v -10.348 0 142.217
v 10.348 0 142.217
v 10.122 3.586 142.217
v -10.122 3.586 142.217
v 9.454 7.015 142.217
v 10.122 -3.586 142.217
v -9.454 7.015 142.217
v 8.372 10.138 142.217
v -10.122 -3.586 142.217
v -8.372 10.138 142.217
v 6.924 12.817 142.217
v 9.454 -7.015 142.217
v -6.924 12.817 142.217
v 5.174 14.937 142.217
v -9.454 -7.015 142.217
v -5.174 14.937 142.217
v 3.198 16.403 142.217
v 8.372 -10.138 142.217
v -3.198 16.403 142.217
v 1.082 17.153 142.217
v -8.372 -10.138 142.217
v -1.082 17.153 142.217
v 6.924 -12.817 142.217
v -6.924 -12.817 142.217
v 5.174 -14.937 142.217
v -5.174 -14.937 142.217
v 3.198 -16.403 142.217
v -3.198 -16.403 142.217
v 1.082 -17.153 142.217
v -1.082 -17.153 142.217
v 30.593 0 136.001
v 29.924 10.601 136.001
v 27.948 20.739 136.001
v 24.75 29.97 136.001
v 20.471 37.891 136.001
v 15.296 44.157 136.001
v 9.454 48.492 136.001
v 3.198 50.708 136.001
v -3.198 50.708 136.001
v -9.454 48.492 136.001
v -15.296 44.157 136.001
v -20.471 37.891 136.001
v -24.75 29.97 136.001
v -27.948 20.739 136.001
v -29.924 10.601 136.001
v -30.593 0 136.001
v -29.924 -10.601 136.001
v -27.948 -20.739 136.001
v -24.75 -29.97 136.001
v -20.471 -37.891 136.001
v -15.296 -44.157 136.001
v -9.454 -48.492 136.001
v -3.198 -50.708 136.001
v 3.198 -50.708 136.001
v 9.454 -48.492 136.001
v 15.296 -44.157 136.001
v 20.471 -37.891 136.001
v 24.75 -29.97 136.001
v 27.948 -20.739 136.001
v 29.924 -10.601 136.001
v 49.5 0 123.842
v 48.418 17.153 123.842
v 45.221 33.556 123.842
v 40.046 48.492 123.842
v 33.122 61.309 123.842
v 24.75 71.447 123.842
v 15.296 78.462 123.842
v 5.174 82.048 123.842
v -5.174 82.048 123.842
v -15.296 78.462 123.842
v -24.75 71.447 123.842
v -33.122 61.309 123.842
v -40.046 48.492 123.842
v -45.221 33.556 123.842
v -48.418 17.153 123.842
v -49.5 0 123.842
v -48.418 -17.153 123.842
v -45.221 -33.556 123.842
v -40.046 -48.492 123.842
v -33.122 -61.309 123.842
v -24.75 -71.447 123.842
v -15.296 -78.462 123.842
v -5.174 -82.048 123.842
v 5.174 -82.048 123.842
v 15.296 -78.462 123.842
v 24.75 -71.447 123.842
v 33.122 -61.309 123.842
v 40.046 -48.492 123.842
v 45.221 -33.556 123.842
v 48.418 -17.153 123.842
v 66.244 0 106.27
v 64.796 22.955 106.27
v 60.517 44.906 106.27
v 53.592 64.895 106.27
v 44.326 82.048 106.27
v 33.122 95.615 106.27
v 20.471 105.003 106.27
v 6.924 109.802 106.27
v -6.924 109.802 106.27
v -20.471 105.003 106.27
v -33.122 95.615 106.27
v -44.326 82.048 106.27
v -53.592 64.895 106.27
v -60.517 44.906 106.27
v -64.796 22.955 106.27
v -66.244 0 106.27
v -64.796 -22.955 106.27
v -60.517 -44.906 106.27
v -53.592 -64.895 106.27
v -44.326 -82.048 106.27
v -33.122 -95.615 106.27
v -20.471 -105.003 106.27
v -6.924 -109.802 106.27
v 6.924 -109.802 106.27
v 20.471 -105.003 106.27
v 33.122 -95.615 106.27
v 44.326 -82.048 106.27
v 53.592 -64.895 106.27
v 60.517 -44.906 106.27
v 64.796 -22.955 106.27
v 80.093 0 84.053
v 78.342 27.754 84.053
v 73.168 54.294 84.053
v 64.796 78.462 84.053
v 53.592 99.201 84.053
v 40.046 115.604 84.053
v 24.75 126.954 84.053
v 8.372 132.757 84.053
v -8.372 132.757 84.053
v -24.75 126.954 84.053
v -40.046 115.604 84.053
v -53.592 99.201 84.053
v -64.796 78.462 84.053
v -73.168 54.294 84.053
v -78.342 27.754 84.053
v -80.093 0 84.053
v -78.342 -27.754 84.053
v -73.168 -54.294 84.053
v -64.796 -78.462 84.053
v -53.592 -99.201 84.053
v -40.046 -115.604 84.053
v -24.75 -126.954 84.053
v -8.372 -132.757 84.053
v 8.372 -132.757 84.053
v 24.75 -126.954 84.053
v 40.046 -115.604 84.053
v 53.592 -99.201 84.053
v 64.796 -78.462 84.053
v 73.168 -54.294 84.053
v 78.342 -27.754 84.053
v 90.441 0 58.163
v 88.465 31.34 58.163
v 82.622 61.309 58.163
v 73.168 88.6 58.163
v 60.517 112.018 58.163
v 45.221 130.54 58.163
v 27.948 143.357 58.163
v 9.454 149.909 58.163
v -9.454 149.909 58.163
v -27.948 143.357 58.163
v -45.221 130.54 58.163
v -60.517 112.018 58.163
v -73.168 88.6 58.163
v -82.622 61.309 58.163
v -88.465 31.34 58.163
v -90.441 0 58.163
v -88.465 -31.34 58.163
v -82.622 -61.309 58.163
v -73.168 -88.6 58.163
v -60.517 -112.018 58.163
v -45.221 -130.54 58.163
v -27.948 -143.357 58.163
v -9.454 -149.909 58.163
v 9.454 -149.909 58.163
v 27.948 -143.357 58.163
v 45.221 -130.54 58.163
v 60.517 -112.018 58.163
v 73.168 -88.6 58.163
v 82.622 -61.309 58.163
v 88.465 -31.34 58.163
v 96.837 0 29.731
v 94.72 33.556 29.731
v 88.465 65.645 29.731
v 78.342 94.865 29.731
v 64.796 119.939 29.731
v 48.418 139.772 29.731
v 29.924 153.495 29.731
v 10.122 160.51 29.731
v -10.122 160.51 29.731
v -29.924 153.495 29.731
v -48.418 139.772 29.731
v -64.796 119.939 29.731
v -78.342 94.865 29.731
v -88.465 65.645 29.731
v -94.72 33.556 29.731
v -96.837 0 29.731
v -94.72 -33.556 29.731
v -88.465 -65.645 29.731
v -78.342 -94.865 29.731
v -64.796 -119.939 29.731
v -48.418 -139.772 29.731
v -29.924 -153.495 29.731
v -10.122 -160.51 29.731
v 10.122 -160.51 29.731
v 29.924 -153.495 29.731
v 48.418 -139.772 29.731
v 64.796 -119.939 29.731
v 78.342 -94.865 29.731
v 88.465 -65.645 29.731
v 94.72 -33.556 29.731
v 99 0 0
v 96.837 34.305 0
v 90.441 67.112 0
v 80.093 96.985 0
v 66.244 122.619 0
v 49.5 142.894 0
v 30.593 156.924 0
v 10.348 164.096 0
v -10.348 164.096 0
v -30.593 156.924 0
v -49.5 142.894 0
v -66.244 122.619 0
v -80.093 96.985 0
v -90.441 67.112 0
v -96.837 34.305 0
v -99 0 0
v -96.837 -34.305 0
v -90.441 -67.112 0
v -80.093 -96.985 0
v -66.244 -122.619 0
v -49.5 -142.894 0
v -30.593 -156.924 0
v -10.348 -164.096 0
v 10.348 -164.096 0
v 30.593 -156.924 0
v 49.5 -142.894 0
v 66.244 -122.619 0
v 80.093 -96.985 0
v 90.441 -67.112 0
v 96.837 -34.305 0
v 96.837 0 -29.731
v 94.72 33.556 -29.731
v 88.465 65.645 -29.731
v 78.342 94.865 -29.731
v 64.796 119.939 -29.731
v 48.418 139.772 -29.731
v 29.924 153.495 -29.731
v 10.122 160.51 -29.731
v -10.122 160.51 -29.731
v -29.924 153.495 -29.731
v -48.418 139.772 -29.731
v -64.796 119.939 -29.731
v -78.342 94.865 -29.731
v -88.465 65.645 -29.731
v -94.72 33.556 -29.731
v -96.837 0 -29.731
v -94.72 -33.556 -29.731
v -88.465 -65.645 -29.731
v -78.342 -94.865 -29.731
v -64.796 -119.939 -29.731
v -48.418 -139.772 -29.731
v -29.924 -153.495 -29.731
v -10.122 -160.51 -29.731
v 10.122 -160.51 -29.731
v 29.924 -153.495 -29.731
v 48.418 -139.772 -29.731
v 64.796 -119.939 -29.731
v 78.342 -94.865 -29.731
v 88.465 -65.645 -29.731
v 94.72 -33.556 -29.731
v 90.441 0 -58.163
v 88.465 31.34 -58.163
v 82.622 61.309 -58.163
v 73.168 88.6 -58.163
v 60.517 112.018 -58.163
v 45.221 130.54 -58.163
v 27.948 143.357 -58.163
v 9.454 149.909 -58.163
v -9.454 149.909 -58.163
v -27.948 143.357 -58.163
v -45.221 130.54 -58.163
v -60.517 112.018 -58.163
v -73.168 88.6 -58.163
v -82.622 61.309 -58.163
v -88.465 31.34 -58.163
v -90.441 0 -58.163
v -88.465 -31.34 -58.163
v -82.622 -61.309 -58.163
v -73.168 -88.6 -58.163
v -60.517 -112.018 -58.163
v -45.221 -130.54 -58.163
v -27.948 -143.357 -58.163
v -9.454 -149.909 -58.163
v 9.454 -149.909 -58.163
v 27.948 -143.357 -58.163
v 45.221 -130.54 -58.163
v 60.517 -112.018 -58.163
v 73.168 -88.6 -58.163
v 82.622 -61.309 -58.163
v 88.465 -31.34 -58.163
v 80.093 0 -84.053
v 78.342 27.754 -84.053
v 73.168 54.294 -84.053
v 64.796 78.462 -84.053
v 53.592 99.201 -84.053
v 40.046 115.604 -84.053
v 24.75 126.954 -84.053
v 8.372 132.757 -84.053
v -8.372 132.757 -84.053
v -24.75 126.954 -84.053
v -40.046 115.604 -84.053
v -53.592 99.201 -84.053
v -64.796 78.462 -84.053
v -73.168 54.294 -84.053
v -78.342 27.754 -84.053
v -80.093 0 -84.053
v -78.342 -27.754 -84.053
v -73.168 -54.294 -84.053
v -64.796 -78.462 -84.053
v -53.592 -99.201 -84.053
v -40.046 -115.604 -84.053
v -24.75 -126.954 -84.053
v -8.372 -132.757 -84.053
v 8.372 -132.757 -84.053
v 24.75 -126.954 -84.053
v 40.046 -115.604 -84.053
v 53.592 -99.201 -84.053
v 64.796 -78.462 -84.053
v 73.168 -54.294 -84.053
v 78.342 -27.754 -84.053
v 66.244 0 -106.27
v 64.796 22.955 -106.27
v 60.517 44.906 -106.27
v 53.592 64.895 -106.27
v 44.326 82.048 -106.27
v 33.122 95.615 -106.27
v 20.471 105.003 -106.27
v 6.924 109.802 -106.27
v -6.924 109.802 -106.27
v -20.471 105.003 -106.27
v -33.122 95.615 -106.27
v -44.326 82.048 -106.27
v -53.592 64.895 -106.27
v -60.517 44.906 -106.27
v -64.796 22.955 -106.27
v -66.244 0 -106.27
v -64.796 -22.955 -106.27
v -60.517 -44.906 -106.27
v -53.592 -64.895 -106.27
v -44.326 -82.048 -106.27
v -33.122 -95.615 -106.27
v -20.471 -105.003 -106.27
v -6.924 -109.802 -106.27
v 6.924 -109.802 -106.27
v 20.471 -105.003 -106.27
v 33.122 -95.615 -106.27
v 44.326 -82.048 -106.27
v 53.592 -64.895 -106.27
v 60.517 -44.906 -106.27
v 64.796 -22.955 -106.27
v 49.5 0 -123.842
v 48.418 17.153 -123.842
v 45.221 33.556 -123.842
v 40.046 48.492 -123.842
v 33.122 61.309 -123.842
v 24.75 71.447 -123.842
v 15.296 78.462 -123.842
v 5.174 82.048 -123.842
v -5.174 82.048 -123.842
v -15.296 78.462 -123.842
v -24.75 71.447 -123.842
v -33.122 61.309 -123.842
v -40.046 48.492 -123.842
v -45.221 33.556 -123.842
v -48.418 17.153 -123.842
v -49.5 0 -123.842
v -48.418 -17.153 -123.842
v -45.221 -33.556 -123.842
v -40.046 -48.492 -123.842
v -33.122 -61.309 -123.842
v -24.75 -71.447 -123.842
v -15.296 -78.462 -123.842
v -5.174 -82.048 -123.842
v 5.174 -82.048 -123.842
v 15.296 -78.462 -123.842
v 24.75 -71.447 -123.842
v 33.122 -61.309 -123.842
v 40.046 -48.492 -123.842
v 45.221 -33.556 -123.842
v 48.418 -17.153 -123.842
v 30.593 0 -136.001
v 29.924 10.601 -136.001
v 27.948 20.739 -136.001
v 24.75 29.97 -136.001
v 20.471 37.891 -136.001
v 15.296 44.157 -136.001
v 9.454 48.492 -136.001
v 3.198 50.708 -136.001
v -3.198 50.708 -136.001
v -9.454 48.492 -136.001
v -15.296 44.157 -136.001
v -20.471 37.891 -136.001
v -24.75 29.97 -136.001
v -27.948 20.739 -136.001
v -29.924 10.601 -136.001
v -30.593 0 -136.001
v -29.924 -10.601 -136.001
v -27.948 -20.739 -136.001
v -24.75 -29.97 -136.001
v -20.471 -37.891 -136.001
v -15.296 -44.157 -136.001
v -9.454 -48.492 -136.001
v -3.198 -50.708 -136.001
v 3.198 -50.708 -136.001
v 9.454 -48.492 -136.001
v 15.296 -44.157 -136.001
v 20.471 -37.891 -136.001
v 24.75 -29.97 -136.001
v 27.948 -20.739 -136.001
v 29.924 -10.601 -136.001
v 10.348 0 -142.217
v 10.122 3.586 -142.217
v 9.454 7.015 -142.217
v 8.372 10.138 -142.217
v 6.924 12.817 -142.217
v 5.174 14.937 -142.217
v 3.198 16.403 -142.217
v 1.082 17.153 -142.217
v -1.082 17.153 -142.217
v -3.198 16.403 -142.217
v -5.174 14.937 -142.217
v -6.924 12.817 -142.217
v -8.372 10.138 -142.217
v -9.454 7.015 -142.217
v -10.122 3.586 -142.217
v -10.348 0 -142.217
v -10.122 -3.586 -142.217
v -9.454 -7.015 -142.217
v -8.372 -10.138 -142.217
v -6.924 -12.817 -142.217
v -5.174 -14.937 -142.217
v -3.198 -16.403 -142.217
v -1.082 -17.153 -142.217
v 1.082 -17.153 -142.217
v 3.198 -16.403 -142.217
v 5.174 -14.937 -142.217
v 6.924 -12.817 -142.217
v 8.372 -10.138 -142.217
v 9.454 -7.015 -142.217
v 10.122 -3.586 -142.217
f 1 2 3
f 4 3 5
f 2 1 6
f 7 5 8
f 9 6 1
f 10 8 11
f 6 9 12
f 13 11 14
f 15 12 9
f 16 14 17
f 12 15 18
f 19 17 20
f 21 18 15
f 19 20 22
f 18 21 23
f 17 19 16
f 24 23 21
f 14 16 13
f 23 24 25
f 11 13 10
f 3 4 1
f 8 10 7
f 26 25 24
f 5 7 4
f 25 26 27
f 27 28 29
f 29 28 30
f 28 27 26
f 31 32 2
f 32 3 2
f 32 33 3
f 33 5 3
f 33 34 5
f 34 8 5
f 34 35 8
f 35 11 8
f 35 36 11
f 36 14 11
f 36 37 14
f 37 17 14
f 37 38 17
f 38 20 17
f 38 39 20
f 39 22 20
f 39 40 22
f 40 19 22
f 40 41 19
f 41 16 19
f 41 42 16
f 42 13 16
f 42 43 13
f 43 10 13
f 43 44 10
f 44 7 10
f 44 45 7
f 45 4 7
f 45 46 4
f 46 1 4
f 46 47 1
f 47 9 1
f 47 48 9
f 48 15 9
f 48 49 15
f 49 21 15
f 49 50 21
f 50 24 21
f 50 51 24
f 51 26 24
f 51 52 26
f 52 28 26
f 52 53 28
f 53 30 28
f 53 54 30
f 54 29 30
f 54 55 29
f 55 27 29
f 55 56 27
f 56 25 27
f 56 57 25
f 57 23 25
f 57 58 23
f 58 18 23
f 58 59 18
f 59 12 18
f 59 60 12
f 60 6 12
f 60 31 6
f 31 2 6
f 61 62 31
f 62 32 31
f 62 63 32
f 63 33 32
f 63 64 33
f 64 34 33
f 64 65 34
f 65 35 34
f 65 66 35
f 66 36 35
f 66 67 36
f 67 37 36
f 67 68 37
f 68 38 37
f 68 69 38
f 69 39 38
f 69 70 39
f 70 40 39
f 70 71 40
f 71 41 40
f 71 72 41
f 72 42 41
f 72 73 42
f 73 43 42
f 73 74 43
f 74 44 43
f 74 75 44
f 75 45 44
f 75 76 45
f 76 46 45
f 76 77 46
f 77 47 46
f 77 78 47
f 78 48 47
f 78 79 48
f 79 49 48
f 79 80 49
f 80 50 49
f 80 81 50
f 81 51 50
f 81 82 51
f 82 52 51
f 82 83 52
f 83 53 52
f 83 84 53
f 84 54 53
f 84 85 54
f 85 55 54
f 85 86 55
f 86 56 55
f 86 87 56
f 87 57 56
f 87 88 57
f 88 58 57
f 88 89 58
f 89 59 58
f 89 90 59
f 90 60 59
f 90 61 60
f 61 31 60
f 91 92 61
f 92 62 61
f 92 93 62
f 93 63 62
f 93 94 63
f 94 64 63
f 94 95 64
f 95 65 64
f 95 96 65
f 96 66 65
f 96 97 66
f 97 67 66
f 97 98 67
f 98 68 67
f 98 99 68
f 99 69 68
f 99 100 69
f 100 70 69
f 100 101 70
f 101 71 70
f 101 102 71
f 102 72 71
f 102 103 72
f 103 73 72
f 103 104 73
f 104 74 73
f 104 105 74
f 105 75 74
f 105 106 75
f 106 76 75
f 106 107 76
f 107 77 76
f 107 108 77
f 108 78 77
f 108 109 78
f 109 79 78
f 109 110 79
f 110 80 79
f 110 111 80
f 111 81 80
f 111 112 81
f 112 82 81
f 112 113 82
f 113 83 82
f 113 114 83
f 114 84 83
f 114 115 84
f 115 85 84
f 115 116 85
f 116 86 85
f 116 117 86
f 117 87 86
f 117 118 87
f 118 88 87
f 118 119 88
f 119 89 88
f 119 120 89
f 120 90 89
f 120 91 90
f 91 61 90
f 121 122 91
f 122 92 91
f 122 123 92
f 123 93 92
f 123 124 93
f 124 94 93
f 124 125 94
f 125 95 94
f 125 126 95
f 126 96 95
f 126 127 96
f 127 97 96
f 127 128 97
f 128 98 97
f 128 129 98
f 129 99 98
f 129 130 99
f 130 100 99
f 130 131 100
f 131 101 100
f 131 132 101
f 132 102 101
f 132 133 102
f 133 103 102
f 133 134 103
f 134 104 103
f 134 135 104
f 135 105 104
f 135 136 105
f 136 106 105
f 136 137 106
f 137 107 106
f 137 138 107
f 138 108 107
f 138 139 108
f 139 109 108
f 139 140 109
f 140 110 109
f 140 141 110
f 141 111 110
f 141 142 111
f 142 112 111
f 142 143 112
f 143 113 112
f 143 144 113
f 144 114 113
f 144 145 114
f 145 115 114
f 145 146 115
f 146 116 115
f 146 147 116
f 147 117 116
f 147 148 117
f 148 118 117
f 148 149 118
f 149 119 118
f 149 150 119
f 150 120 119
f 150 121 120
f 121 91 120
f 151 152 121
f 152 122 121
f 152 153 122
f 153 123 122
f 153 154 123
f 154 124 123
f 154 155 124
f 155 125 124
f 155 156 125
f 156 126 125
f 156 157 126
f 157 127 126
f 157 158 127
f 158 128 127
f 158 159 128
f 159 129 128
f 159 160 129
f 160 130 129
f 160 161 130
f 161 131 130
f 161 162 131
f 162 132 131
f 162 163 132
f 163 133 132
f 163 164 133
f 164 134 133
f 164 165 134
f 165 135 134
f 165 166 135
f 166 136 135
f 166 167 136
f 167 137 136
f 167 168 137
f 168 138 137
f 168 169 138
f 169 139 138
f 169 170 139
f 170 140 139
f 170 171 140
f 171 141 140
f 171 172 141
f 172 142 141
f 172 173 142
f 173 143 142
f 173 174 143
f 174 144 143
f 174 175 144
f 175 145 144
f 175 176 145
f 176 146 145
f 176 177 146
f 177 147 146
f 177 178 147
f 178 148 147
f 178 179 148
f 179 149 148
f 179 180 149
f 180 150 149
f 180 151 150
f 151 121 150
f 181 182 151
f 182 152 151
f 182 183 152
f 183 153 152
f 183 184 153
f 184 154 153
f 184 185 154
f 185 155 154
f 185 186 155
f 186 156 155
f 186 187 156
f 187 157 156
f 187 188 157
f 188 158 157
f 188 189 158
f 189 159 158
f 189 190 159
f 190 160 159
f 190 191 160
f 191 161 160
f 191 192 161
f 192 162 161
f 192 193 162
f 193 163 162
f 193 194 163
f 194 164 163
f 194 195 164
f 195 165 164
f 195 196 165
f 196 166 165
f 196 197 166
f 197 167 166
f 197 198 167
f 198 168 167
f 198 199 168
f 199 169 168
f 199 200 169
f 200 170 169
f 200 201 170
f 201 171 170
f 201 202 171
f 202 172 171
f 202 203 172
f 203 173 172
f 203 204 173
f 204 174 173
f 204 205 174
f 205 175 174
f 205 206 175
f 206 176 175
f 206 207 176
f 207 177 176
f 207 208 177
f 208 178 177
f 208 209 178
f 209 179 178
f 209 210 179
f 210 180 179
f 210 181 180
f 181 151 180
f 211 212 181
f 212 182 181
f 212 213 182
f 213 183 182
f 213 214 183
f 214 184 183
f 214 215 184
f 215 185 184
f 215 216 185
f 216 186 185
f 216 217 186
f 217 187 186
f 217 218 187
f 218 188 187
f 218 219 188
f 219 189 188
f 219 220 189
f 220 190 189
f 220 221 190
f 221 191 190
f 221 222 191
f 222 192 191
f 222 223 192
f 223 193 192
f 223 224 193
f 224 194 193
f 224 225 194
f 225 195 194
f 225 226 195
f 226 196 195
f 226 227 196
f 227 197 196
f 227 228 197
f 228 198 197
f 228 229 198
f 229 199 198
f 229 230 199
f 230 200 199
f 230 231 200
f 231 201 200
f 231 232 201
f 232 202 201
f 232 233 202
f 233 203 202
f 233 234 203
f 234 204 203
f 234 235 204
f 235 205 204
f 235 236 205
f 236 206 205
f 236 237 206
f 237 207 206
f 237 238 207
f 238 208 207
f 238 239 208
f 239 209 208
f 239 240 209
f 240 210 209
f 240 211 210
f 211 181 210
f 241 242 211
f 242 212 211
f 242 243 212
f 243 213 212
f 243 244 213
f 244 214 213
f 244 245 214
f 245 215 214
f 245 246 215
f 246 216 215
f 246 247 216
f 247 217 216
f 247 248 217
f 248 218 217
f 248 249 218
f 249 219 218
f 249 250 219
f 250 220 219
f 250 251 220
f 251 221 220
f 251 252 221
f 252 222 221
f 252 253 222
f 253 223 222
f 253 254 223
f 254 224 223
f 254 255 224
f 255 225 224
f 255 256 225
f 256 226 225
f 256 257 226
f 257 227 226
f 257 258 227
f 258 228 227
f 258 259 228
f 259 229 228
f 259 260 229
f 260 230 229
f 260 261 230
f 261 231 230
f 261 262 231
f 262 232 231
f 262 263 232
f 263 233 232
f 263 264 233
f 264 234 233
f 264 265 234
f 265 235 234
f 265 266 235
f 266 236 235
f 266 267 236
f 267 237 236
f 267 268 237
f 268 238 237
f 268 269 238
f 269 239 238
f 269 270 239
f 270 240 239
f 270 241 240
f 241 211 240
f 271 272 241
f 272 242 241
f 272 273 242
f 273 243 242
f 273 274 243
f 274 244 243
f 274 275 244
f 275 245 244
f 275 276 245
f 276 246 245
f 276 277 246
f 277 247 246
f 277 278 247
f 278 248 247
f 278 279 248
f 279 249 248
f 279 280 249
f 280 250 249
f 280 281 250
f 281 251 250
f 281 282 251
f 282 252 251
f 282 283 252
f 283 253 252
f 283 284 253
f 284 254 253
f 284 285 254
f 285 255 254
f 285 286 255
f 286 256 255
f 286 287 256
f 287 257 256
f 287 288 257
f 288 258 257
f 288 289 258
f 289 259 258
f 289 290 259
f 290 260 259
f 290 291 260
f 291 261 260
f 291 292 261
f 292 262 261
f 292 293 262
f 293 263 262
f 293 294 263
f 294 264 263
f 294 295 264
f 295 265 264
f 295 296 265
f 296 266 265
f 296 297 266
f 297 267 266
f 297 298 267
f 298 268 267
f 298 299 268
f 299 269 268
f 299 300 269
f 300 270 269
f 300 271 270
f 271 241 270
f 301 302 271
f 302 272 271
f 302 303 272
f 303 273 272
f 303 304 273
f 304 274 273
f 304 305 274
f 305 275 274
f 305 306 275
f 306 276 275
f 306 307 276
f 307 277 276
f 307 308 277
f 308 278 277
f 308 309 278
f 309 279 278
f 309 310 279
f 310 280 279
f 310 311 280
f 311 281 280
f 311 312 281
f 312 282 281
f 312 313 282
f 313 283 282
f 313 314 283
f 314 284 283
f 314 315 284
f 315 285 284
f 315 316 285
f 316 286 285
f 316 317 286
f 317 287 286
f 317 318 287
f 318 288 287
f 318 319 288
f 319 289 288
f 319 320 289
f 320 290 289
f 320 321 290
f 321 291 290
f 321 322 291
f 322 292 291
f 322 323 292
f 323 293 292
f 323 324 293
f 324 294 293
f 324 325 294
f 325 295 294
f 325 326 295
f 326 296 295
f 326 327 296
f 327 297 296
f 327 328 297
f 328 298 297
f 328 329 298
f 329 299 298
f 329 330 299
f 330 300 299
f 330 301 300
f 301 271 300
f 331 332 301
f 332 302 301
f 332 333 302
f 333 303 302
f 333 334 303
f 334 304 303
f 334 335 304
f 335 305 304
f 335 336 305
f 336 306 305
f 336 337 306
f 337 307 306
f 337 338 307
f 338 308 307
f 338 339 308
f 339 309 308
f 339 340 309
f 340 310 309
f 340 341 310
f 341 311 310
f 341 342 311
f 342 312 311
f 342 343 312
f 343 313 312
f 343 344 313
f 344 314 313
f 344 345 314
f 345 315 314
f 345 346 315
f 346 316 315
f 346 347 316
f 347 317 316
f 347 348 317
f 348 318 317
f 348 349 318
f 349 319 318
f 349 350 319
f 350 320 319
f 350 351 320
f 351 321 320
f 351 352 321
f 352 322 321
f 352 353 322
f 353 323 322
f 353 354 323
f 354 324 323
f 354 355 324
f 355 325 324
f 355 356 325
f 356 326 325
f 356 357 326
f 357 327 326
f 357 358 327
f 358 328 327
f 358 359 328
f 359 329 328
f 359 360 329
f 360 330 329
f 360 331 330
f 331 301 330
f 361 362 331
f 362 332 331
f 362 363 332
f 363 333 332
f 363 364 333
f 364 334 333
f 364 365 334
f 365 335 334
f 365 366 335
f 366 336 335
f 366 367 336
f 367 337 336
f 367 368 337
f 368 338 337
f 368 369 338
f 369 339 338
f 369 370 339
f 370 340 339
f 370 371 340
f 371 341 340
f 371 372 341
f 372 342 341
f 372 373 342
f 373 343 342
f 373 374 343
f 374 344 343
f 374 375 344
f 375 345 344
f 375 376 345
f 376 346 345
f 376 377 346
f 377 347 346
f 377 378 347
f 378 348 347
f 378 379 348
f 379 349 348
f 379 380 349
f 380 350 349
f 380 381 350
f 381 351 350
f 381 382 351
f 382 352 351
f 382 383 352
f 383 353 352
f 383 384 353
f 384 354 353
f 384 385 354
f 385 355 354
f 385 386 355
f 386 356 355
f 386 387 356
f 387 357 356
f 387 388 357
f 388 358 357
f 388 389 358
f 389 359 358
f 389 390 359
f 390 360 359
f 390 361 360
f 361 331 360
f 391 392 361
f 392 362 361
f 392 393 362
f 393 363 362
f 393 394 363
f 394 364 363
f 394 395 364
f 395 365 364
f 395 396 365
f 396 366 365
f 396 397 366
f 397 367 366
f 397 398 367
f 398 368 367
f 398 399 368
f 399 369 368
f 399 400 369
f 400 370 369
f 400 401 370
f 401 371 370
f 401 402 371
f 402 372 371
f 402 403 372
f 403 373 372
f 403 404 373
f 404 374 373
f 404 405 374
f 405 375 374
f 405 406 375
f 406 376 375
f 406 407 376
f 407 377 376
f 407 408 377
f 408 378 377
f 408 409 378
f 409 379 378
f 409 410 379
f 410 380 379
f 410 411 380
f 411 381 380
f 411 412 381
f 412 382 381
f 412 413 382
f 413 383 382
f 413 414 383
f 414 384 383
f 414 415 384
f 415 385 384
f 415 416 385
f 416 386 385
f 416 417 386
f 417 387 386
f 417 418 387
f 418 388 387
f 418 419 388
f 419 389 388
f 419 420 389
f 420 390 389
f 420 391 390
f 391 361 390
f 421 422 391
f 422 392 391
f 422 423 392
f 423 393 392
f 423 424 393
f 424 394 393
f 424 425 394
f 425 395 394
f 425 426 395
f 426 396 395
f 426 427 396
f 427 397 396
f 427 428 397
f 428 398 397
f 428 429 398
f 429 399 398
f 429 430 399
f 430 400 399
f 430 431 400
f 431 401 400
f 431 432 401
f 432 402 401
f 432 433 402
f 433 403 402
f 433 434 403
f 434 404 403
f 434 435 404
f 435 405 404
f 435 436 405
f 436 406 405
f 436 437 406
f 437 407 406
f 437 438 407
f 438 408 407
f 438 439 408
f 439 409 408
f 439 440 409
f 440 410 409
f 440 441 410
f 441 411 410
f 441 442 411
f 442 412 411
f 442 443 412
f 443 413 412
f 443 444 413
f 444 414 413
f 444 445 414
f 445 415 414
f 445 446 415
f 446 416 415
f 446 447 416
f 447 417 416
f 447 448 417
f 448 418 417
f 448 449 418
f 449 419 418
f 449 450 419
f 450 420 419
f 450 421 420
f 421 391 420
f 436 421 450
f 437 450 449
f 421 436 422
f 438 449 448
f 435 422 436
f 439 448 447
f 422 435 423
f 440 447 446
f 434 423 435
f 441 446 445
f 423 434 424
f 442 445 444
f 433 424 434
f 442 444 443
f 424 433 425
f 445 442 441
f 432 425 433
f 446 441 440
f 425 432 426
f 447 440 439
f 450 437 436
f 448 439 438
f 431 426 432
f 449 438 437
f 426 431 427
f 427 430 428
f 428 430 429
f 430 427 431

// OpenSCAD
// Generated by SolidPython 1.0.1 on 2020-07-29 00:46:49


scale(v = [9, 15, 13]) {
	sphere(r = 11);
}
/***********************************************
*********      SolidPython code:      **********
************************************************
 
# import packages: SolidPython
from solid import *
from solid.utils import *
from itertools import chain, combinations, permutations


class Resize:

    def __init__(self, scad_file):
        self.scad_file = scad_file
        #self.scad_file = import_scad(scad_file)
        # cone/cylinder param:
        self.r1 = 0
        self.r2 = 0
        self.h = 0
        # rectangular prism param:
        self.w = 0
        self.l = 0
        # ellipse param:
        self.r = 0

    # import OpenScad code (file name corresponds to shape)


    # classify shape + parameters
    def assign(self, param1, param2, param3):
        if self.scad_file == 'cone.scad':
            self.r1 = param1
            self.r2 = param2
            self.h = param3
        elif self.scad_file == 'cylinder.scad':
            self.r1 = param1
            self.r2 = param2
            self.h = param3
        elif self.scad_file == 'rectangularPrism.scad':
            self.h = param1
            self.l = param2
            self.w = param3
        else:
            self.r = param1
            self.h = param2

    # resize parameters
    def iterate(self):
        x = range(3, 20, 2)
        i = 1
        if self.scad_file == 'cone.scad':
            tempList = list(permutations(x, 2))
            for temp in tempList:
                param1 = temp[0]
                param2 = temp[1]
                filepath = 'produced_scad_files/' + 'cone' + str(param1) + '_' + str(param2) + '_' + '.scad'
                scad_render_to_file(cylinder(h=param1, r1=param2, r2=0), filepath)

        elif self.scad_file == 'cylinder.scad':
            tempList = list(permutations(x, 3))
            for temp in tempList:
                param1 = temp[0]
                param2 = temp[1]
                filepath = 'produced_scad_files/' + 'cylinder' + str(param1) + '_' + str(param2) + '_' + '.scad'
                scad_render_to_file(cylinder(h=param1, r1=param2, r2=param2), filepath)

        elif self.scad_file == 'rectangularPrism.scad':
            tempList = list(permutations(x, 3))
            for temp in tempList:
                param1 = temp[0]
                param2 = temp[1]
                param3 = temp[2]
                filepath = 'produced_scad_files/' + 'rectangularPrism' + str(param1) + '_' + str(param2) + '_' + str(
                    param3) + '.scad'
                scad_render_to_file(cube(size=(param1, param2, param3)), filepath)

        elif self.scad_file == 'ellipse.scad':
            tempList = list(permutations(x, 4))
            for temp in tempList:
                param1 = temp[0]
                param2 = temp[1]
                param3 = temp[2]
                param4 = temp[3]
                filepath = 'produced_scad_files/' + 'ellipse' + str(param1) + '_' + str(param2) + '_' + str(param3) + '_' + str(param4) + '.scad'
                scad_render_to_file(scale([param1, param2, param3])(sphere(r=param4)), filepath)

    def render_to_scadfile(self):
        scad_render_to_file(scad, 'example.scad') 
 
************************************************/
